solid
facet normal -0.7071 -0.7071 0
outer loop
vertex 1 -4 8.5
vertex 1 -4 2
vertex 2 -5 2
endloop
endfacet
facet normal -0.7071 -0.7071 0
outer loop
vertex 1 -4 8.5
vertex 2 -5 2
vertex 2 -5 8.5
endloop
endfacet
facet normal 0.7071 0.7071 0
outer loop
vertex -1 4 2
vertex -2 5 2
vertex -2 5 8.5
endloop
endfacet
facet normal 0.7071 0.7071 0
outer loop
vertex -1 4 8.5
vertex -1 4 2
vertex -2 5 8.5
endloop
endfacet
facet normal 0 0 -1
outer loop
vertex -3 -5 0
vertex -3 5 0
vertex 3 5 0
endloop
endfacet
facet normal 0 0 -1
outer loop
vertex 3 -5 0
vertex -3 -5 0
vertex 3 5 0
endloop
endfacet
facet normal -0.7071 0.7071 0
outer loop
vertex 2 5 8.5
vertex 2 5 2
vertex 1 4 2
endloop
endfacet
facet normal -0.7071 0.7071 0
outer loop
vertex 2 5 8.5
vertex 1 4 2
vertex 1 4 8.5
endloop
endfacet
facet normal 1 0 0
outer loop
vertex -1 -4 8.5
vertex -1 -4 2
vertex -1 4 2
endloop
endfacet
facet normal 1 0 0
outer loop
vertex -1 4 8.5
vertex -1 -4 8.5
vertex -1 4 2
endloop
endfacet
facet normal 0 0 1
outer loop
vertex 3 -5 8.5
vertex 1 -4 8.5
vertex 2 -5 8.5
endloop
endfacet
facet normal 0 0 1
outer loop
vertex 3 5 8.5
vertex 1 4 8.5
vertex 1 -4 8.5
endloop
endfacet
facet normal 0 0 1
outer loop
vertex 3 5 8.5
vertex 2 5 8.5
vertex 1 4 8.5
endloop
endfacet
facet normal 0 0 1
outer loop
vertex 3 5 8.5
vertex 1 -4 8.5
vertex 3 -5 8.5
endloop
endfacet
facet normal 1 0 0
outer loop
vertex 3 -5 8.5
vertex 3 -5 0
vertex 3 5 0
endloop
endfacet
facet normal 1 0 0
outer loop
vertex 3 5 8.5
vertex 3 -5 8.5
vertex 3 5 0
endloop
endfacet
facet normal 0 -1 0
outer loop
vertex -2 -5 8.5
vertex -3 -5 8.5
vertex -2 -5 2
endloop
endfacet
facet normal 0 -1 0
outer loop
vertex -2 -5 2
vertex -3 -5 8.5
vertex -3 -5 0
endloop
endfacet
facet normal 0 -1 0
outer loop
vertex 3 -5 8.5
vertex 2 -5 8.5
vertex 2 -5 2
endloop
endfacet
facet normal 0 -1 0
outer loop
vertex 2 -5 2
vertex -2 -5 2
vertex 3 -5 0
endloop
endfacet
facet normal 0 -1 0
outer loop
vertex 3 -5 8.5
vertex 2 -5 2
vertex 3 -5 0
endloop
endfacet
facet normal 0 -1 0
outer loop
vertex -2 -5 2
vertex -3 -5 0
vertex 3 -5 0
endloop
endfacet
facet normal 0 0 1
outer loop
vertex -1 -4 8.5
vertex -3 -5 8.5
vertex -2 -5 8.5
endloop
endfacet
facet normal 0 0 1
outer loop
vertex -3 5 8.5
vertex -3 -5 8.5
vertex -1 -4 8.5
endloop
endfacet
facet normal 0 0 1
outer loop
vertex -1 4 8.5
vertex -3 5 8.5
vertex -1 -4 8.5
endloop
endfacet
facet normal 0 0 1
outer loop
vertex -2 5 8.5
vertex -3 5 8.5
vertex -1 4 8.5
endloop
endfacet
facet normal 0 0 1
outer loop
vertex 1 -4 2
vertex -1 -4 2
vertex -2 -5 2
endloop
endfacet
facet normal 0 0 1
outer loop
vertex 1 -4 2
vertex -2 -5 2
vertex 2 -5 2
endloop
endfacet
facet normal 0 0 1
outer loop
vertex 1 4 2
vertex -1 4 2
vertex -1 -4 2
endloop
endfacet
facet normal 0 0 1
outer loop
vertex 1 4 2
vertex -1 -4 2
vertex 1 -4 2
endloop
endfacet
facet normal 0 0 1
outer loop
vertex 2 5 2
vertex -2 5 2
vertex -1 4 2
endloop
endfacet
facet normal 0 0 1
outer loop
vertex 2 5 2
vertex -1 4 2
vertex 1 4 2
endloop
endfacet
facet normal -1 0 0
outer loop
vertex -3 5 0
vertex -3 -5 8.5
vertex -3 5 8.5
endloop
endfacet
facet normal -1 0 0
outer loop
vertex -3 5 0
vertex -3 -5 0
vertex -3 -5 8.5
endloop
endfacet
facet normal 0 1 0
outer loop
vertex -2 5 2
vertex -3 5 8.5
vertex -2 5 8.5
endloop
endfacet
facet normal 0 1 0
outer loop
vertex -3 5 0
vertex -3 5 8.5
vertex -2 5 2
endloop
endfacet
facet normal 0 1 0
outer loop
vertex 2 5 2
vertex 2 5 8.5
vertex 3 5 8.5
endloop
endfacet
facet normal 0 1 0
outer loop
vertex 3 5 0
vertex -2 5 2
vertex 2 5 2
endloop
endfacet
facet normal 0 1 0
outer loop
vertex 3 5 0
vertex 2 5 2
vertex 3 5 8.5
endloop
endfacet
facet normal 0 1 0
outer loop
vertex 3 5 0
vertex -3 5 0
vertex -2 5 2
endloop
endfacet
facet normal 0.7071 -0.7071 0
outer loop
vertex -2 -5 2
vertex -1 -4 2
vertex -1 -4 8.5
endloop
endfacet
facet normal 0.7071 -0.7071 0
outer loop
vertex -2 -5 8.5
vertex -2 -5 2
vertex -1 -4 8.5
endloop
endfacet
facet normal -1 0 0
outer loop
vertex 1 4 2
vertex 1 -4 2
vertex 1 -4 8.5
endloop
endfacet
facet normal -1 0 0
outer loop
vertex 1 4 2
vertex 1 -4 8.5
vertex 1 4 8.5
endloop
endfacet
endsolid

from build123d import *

# Parameters (mm, degrees)
SKETCH_W     = 6
SKETCH_H     = 10
PAD_DEPTH    = 2
SKETCH001_W  = 2
SKETCH001_H  = 10
PAD001_DEPTH = 6.5
CHAMFER_SIZE = 1


with BuildPart() as part:
    # Sketch → Pad (new body)
    with BuildSketch(Plane.XY):
        Rectangle(SKETCH_W, SKETCH_H)
    extrude(amount=PAD_DEPTH)

    # Sketch001 (on Face6 of Pad) → Pad001 (join)
    with BuildSketch(Plane.XY.offset(2)):
        with Locations((-2, 0)):
            Rectangle(SKETCH001_W, SKETCH001_H)
        with Locations((2, 0)):
            Rectangle(SKETCH001_W, SKETCH001_H)
    extrude(amount=PAD001_DEPTH)

    # Chamfer
    chamfer_edges = [part.edges().sort_by_distance(p)[0] for p in [
        (-1, -5, 5.25),
        (1, -5, 5.25),
        (-1, 5, 5.25),
        (1, 5, 5.25),
    ]]
    chamfer(chamfer_edges, length=CHAMFER_SIZE)


solid = part.part
